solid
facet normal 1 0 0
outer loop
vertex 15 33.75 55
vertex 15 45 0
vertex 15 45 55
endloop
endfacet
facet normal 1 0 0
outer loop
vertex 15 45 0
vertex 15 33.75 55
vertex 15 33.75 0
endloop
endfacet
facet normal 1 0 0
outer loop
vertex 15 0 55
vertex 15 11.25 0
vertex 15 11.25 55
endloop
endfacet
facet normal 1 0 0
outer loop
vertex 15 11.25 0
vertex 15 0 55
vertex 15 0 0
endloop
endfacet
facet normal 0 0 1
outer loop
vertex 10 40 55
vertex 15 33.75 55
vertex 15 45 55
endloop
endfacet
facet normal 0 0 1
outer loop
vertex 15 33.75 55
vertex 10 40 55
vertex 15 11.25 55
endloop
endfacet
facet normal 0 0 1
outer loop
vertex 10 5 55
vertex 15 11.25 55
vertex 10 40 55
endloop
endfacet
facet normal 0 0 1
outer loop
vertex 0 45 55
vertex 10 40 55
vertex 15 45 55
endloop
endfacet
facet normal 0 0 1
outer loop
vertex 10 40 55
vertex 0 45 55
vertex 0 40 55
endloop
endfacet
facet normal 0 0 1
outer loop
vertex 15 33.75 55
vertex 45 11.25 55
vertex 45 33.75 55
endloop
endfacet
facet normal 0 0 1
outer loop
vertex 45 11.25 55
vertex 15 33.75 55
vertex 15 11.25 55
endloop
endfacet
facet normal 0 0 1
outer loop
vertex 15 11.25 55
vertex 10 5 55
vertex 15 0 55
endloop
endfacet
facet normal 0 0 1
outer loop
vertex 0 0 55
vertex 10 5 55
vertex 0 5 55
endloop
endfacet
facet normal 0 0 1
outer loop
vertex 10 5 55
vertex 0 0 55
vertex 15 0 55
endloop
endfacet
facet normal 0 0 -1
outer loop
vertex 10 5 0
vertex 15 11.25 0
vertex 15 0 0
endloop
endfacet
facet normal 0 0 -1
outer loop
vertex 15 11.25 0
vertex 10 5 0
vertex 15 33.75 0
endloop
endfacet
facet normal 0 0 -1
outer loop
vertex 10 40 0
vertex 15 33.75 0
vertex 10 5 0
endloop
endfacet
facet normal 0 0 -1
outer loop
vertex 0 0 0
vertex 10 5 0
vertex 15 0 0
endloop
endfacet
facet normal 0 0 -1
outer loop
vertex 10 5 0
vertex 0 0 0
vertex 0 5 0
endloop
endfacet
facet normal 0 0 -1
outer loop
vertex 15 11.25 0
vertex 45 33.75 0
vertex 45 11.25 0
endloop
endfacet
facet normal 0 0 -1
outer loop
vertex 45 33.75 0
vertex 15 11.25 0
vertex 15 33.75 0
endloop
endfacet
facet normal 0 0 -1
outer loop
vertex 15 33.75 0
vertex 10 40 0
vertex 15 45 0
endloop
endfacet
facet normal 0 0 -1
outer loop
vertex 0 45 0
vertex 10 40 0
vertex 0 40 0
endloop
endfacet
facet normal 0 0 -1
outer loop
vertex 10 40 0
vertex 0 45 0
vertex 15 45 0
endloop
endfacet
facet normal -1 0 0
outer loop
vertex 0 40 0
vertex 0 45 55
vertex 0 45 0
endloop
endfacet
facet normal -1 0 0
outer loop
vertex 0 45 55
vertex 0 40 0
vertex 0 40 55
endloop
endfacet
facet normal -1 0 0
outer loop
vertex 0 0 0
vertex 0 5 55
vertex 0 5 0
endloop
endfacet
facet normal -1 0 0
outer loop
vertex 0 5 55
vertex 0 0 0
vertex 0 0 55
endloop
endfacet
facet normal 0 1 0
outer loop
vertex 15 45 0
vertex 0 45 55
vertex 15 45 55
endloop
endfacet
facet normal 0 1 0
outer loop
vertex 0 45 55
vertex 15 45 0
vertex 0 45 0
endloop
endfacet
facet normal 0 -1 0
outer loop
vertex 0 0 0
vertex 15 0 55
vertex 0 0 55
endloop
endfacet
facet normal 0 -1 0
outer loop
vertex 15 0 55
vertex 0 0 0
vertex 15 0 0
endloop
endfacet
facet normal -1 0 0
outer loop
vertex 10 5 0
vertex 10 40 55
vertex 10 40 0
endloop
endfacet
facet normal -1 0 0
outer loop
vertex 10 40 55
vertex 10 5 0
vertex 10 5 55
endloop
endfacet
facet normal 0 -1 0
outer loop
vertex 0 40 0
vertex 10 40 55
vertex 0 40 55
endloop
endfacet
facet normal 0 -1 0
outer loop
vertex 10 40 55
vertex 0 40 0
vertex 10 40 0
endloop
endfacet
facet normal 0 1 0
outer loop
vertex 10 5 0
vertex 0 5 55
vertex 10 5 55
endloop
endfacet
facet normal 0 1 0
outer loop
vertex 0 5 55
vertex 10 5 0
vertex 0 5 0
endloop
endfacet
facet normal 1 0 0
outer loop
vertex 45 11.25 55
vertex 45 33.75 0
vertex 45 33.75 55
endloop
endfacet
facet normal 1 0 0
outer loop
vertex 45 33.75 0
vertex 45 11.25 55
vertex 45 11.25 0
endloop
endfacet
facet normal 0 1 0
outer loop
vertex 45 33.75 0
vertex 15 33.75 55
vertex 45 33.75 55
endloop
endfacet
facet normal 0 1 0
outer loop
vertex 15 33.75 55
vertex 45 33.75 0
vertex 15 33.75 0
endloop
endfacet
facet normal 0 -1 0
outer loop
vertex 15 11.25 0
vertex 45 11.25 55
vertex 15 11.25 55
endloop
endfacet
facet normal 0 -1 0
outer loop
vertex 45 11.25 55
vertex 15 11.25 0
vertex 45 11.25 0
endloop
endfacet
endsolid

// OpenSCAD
thickness = 55;
midBarOffset = 15;

gap = 35;
clawTotal = gap + 10;

difference() {
    cube([15, clawTotal, thickness]);
    translate([0, 5, 0])
        #cube([10, gap, thickness]);
}

translate([midBarOffset, clawTotal / 4, 0])
    cube([30, clawTotal / 2, thickness]);
